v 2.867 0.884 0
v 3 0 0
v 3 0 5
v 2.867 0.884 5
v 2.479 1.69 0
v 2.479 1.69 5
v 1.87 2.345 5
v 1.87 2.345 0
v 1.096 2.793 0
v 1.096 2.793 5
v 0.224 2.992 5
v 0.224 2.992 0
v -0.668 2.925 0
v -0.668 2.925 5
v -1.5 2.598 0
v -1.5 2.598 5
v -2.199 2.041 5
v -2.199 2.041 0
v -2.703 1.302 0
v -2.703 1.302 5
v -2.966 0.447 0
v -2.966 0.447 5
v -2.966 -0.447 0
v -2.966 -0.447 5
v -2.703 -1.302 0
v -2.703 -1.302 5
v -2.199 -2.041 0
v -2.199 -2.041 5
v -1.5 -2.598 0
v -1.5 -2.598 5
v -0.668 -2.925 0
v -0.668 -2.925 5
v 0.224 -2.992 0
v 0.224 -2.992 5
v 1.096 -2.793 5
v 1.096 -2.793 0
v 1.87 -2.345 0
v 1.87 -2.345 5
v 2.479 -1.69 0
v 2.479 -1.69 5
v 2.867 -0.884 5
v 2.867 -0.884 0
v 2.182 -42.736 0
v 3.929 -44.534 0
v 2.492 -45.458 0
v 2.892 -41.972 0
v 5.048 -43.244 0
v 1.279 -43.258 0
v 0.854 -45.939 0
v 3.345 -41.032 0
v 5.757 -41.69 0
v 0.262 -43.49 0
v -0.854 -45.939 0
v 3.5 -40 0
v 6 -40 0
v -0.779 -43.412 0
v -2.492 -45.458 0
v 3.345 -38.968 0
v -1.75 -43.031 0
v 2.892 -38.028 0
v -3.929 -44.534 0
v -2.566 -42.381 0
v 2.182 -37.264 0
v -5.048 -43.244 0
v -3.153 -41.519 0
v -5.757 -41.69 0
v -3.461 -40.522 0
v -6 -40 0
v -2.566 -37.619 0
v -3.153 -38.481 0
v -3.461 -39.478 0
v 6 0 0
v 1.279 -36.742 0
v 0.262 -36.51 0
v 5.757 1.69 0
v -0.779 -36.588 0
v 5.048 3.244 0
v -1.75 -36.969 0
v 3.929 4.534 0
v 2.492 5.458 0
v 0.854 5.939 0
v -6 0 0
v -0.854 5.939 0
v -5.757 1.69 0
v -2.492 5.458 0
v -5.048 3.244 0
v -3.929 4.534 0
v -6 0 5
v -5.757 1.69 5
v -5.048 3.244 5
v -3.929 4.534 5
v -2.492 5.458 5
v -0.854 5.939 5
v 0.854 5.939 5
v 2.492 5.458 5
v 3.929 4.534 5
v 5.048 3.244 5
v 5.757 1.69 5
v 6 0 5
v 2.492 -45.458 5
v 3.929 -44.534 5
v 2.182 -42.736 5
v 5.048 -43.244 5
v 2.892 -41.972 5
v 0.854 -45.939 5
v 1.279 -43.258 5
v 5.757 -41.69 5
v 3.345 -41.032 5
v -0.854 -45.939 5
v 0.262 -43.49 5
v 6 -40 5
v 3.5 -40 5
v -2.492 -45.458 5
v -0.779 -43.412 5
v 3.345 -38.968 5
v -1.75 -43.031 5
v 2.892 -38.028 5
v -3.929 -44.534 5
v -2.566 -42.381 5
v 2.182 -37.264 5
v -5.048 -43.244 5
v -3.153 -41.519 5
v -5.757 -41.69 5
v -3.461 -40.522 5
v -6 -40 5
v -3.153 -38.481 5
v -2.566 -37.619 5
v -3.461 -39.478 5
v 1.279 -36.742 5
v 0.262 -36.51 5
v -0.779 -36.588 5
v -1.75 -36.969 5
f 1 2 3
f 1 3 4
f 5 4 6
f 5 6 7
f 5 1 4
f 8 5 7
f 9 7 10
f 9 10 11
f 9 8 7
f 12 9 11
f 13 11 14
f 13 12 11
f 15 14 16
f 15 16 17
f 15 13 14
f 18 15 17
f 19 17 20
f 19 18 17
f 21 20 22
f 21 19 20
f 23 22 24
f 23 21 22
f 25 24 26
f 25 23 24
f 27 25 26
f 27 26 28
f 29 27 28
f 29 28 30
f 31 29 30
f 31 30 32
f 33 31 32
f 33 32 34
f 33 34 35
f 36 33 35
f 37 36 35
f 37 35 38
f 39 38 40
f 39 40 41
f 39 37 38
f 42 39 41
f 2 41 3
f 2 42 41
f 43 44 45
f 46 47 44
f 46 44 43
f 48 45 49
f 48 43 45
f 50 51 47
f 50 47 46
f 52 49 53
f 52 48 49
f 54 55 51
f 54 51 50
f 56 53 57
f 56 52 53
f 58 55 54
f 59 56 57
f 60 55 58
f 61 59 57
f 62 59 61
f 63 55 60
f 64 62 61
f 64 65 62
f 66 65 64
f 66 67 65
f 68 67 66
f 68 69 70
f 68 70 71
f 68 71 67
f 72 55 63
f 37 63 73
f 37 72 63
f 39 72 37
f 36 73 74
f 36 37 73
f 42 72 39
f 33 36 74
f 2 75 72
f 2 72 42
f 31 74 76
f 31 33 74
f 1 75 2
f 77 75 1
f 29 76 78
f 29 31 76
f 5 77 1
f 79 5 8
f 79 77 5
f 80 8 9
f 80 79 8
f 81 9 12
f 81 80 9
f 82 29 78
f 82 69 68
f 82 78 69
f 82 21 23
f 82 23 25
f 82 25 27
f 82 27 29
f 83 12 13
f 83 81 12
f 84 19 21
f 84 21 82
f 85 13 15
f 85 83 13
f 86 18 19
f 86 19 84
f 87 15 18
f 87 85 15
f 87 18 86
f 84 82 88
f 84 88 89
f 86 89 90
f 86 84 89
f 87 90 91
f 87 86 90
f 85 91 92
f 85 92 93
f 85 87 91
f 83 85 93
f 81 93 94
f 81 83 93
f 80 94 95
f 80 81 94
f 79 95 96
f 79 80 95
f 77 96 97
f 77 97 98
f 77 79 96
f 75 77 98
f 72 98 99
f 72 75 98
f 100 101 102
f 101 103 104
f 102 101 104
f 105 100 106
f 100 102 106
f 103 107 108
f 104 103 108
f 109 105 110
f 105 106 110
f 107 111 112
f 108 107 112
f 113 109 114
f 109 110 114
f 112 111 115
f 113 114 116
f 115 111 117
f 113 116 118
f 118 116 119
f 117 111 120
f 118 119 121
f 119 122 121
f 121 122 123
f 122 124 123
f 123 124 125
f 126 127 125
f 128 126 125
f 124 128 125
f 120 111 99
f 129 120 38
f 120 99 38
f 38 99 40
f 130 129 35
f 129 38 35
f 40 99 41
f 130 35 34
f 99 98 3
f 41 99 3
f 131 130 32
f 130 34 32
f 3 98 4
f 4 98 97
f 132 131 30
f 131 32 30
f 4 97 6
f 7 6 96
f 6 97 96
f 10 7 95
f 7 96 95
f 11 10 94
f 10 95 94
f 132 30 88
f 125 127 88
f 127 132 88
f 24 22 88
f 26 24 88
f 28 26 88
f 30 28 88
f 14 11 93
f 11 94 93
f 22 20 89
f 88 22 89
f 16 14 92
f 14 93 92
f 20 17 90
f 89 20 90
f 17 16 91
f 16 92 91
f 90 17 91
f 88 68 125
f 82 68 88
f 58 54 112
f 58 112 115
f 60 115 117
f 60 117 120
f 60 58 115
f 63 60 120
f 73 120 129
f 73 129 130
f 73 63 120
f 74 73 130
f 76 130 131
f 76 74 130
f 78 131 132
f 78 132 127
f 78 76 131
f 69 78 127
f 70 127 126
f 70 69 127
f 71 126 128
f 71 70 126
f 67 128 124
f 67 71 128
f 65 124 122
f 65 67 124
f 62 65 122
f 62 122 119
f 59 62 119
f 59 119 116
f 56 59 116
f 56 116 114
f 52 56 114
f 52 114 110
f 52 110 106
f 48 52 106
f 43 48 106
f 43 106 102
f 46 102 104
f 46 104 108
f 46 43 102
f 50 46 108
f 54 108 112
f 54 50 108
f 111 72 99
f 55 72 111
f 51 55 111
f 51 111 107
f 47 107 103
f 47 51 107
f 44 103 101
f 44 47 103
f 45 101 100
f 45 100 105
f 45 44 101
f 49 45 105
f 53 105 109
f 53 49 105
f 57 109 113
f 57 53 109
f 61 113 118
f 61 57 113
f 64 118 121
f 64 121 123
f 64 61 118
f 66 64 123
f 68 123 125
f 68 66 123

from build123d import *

# Parameters (mm, degrees)
SZKIC1_R                    = 3
SZKIC1_R_2                  = 3.5
DODANIE_WYCI_GNI_CIE1_DEPTH = 5


with BuildPart() as part:
    # Szkic1 → Dodanie-wyciągnięcie1 (new body)
    with BuildSketch(Plane.XY):
        with BuildLine():
            Line((-6, -40), (-6, 0))
            ThreePointArc((-6, 0), (0, 6), (6, 0))
            Line((6, 0), (6, -40))
            ThreePointArc((6, -40), (0, -46), (-6, -40))
        make_face()
        Circle(SZKIC1_R, mode=Mode.SUBTRACT)
        with Locations((0, -40)):
            Circle(SZKIC1_R_2, mode=Mode.SUBTRACT)
    extrude(amount=DODANIE_WYCI_GNI_CIE1_DEPTH)


solid = part.part
